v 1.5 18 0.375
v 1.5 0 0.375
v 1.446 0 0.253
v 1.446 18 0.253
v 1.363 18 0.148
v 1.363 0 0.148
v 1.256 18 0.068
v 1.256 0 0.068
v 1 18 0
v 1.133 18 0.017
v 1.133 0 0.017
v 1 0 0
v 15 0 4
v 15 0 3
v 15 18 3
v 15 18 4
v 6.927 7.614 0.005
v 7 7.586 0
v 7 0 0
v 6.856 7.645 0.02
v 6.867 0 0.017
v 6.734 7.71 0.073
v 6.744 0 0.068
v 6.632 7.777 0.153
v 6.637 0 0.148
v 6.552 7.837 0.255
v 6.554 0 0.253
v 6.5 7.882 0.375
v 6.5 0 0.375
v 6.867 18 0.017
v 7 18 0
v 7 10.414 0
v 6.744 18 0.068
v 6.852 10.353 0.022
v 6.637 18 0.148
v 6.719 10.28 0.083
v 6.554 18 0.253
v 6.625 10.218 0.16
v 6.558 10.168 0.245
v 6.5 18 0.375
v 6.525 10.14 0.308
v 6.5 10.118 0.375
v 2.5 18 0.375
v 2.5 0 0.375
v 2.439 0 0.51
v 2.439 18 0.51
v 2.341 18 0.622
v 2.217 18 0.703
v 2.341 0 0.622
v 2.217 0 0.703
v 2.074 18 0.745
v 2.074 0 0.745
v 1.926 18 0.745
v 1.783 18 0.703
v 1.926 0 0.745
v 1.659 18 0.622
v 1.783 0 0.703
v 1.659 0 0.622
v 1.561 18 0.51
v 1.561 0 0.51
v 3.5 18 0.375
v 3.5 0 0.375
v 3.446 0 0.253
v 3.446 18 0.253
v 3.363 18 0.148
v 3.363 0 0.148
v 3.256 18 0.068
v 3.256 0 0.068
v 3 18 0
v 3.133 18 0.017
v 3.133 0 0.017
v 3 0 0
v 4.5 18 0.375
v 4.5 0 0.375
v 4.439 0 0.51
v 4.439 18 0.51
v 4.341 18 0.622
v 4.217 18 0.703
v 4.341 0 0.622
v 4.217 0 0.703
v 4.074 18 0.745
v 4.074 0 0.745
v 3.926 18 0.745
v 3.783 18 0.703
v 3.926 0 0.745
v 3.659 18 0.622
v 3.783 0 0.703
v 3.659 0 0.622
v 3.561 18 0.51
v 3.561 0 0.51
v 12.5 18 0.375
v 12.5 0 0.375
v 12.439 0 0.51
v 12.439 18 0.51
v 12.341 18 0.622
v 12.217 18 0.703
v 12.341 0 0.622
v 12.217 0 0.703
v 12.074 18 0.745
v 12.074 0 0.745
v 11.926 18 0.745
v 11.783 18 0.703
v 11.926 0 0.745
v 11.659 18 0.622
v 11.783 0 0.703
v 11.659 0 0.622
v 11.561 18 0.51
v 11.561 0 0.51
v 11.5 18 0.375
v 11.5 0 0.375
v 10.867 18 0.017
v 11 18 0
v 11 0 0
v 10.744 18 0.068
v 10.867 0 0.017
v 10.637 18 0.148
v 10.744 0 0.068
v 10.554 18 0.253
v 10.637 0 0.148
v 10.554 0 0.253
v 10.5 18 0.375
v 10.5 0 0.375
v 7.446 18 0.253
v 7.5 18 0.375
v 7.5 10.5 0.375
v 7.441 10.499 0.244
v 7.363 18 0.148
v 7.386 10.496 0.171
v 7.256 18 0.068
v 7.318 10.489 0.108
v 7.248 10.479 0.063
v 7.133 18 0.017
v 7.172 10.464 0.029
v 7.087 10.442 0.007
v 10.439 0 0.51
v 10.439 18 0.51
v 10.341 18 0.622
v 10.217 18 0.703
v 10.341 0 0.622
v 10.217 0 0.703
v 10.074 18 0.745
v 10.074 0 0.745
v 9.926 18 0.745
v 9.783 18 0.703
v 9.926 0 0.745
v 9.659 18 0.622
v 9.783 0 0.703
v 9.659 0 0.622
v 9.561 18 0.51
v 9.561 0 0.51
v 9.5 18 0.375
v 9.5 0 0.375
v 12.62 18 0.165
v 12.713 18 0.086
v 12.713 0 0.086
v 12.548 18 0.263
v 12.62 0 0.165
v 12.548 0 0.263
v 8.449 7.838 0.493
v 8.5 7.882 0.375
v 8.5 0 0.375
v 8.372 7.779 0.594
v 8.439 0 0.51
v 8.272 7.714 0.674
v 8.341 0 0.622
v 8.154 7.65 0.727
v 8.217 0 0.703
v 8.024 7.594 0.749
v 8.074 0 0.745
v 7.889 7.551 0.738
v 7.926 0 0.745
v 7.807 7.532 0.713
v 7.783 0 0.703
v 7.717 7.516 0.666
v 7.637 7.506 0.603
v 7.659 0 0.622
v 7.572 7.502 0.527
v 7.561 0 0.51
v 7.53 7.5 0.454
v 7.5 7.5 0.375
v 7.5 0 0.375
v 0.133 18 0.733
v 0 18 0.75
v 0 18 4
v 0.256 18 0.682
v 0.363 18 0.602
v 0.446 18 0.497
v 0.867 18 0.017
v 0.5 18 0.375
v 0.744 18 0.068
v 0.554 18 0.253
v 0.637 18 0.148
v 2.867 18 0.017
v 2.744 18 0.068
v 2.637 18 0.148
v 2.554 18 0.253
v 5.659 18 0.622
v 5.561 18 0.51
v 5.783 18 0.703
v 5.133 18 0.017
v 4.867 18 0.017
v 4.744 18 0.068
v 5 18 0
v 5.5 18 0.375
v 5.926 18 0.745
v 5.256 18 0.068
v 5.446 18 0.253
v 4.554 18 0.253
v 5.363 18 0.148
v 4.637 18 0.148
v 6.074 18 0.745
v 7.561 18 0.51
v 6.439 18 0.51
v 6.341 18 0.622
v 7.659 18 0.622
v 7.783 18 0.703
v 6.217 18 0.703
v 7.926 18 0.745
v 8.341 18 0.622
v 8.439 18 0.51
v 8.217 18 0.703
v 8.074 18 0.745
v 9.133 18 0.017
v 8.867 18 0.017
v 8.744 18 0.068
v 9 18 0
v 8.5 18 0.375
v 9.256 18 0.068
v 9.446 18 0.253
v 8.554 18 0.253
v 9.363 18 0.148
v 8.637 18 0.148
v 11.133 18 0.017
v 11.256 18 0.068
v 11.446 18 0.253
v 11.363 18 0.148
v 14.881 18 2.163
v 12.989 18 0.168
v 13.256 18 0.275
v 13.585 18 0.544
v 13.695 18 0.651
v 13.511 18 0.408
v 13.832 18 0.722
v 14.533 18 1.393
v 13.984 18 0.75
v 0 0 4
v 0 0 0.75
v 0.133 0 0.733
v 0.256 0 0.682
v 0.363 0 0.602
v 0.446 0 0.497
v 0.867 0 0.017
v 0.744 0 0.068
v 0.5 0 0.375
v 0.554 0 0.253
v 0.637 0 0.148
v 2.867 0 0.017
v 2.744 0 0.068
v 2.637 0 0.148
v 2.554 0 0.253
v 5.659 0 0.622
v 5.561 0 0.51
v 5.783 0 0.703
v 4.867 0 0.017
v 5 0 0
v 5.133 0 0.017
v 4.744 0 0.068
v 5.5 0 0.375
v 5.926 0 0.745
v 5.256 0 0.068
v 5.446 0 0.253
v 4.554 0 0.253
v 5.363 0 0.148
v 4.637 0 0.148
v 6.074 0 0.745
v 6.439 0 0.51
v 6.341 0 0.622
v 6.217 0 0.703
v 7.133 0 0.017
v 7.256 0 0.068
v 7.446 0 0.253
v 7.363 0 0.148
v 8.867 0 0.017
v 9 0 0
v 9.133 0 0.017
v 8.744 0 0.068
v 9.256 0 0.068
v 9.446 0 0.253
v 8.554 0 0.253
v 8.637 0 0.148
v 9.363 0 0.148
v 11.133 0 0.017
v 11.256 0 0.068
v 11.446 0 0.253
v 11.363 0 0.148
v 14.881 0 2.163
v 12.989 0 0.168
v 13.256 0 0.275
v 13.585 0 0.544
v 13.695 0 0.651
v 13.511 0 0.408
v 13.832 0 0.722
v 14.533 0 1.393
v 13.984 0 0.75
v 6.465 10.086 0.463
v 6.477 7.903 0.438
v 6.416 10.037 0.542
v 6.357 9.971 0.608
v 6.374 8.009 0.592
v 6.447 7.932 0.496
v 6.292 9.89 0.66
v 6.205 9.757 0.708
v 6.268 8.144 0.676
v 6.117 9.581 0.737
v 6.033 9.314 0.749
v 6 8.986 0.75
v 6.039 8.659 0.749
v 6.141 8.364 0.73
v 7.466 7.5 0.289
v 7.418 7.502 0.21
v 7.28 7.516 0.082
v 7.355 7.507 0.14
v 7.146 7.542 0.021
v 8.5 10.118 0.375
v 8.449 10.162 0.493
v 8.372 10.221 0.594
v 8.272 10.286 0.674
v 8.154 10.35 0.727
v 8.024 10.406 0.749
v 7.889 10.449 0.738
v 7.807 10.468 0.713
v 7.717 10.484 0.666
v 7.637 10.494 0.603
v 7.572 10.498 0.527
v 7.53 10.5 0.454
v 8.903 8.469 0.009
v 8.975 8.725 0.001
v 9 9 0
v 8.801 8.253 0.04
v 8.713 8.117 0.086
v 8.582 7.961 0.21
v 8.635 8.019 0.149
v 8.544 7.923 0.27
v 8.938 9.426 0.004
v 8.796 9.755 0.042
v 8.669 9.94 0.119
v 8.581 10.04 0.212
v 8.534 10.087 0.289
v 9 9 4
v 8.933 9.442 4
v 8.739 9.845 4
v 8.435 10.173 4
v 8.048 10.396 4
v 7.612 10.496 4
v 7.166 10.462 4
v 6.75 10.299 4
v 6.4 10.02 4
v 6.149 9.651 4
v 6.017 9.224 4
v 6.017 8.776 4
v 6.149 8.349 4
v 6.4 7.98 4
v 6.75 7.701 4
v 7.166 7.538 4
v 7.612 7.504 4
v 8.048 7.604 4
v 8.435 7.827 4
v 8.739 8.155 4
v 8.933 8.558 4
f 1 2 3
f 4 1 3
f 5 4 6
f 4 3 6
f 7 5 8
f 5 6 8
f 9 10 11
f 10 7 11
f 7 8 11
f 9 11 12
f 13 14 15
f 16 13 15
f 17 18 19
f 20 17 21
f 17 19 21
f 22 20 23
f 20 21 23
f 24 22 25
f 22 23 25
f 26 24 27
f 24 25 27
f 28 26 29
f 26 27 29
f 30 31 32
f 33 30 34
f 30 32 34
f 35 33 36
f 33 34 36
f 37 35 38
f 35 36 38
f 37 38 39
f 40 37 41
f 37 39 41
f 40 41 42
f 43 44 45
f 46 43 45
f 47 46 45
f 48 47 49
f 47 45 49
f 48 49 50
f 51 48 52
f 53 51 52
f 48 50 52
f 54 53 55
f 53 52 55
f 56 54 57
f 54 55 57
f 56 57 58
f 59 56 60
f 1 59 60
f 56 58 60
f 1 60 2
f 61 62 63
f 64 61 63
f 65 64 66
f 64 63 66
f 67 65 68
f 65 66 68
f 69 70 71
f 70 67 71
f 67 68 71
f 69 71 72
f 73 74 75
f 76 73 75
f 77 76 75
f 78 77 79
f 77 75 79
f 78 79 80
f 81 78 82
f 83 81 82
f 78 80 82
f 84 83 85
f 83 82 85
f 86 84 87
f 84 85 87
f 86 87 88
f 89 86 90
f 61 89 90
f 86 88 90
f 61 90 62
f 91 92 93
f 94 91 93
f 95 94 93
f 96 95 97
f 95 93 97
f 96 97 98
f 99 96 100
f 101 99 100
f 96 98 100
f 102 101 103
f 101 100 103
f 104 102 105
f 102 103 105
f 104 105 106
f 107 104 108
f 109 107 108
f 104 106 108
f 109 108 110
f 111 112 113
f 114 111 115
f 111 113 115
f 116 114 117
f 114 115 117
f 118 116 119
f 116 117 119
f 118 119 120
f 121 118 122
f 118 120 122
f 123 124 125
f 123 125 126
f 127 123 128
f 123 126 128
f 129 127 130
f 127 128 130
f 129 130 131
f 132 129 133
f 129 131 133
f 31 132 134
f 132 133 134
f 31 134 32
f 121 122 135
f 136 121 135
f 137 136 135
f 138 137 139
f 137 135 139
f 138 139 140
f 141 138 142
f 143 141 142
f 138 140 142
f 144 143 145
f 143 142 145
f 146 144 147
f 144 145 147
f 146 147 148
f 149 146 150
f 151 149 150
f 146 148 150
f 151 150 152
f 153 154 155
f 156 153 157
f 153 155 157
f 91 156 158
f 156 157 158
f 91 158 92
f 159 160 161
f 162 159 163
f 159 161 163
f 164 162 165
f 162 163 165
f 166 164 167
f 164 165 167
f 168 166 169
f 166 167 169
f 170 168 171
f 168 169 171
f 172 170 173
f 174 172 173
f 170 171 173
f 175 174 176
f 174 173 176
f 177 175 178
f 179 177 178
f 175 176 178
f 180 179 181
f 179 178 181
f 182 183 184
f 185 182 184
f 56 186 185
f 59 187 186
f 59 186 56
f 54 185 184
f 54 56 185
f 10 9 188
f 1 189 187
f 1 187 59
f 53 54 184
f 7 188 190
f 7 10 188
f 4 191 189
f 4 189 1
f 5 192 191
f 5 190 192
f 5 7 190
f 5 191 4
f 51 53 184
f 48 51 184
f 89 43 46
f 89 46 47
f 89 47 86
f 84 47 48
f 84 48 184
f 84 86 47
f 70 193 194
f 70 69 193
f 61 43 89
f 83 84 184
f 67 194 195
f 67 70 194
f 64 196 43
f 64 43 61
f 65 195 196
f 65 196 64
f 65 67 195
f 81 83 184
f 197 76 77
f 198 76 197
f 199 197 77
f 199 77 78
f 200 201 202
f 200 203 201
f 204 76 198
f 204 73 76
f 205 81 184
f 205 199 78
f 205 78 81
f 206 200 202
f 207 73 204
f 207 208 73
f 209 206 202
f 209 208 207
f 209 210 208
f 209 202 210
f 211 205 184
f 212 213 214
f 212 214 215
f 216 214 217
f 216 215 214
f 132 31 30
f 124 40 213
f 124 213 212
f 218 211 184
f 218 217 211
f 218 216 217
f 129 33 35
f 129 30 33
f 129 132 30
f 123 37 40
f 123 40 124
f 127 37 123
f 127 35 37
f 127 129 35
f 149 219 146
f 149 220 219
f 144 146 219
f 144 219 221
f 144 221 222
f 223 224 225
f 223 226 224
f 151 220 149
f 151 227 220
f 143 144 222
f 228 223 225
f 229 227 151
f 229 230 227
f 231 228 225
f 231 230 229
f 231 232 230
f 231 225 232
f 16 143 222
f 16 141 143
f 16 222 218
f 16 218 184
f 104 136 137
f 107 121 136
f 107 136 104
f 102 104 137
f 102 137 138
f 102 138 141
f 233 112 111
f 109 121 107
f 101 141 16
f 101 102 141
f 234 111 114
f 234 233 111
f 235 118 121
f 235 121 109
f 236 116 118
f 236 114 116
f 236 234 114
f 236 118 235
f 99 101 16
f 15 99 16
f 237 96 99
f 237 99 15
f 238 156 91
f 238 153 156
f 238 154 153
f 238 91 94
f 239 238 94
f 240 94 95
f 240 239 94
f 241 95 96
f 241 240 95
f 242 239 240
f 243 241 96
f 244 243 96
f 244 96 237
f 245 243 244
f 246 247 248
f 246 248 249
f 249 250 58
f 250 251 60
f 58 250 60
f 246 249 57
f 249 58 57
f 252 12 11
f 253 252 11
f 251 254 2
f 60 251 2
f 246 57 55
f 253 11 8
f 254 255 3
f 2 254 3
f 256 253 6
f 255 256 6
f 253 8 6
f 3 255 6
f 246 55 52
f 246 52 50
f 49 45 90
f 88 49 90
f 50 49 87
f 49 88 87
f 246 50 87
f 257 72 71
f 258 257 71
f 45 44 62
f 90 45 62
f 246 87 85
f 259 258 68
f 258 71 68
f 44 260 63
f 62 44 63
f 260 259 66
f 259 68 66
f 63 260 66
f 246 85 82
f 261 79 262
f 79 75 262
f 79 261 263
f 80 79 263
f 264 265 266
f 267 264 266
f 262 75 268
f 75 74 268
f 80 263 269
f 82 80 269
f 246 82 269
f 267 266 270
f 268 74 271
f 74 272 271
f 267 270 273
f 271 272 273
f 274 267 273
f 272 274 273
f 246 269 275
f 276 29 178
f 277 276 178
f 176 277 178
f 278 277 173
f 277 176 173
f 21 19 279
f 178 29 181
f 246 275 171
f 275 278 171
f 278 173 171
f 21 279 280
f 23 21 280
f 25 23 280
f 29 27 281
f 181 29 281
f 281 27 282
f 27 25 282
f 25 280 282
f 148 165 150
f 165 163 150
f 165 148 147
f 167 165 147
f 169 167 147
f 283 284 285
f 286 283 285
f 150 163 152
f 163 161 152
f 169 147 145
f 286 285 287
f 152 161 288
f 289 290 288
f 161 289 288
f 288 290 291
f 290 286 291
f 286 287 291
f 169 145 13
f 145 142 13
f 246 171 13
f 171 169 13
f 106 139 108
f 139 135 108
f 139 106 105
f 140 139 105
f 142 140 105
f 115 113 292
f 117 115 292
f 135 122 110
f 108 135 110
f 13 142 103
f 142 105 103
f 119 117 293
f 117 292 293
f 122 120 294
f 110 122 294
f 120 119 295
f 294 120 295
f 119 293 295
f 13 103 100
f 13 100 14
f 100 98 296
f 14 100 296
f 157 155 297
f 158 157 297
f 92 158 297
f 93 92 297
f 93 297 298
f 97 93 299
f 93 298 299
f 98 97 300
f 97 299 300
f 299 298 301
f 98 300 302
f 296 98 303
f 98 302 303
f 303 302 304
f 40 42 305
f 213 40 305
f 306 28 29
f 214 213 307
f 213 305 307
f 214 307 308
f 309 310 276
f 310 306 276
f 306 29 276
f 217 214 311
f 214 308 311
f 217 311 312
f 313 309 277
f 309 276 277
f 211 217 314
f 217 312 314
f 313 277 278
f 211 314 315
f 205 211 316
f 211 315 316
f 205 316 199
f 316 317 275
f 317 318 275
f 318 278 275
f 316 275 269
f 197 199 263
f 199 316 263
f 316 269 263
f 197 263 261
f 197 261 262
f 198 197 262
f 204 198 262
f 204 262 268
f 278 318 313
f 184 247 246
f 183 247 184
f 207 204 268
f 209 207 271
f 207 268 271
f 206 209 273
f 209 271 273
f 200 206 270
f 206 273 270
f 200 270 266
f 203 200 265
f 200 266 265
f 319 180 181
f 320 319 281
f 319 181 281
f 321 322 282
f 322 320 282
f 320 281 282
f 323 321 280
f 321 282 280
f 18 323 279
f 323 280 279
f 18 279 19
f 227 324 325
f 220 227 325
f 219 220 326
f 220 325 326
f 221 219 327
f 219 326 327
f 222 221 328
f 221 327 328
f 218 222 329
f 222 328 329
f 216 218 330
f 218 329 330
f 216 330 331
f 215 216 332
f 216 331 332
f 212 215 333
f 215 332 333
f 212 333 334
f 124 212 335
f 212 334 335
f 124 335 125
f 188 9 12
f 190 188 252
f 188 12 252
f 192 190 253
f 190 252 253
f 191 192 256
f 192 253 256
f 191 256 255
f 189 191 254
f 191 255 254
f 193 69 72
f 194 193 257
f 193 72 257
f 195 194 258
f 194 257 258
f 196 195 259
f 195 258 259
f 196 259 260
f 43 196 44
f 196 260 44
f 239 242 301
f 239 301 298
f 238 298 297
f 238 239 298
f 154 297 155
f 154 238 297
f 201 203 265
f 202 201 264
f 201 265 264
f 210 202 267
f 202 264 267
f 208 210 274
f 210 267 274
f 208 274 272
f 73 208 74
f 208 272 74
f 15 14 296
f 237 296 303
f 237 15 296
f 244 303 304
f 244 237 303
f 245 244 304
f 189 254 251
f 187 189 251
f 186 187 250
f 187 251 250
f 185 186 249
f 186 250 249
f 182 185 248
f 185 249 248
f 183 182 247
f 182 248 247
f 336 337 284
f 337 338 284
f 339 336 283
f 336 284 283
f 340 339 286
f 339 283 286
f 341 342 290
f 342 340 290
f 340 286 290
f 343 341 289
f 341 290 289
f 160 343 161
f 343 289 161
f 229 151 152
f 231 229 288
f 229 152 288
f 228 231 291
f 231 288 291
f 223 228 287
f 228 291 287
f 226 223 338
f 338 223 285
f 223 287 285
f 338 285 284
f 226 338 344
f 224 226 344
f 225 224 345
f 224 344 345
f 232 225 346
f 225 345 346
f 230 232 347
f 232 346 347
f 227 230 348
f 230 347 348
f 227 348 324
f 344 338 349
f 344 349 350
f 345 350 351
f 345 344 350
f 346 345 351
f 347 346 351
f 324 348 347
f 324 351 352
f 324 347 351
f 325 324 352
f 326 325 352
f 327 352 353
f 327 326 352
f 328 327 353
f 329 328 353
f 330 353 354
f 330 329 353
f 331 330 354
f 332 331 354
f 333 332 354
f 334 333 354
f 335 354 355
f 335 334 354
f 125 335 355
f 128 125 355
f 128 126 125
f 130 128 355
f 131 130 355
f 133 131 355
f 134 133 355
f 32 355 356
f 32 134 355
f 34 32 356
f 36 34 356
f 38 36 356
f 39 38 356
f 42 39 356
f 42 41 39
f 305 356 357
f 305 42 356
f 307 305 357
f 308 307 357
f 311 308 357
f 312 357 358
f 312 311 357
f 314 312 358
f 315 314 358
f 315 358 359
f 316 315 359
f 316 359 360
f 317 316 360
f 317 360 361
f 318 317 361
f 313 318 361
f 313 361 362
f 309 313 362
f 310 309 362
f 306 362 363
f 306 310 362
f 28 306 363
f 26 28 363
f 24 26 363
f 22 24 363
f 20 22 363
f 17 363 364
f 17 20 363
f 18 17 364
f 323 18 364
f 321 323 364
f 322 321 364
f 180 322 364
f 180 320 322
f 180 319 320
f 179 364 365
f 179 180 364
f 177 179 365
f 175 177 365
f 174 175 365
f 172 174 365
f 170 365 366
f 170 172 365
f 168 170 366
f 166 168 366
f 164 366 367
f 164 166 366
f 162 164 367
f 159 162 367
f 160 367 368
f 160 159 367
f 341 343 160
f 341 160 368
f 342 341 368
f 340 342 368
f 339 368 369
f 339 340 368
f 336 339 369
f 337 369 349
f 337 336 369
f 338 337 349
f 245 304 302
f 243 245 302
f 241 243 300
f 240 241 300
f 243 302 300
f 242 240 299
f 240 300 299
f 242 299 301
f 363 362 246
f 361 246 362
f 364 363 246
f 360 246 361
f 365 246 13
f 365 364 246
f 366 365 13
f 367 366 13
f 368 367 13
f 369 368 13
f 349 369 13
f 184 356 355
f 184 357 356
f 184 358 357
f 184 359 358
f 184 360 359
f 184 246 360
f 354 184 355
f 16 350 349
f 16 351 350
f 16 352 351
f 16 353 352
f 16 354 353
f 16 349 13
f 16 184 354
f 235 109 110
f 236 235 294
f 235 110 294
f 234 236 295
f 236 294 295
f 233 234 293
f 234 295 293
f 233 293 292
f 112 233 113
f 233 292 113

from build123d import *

# Parameters (mm, degrees)
SKETCH1_W           = 15
SKETCH1_H           = 18
SKETCH1_R           = 1.5
BOSS_EXTRUDE1_DEPTH = 4
FILLET1_R           = 3
CUT_EXTRUDE2_DEPTH  = 24.769728648
LPATTERN1_COUNT     = 10
LPATTERN1_PITCH     = 2


with BuildPart() as part:
    # Sketch1 → Boss-Extrude1 (new body)
    with BuildSketch(Plane.XY):
        with Locations((7.5, 9)):
            Rectangle(SKETCH1_W, SKETCH1_H)
        with Locations((7.5, 9)):
            Circle(SKETCH1_R, mode=Mode.SUBTRACT)
    extrude(amount=BOSS_EXTRUDE1_DEPTH)

    # Fillet1
    fillet1_edges = [part.edges().sort_by_distance(p)[0] for p in [
        (15, 9, 0),
    ]]
    fillet(fillet1_edges, radius=FILLET1_R)

    # Sketch2 → Cut-Extrude2 (cut, through all)
    with BuildSketch(Plane(origin=(0, 0, 0), x_dir=(1, 0, 0), z_dir=(0, 1, 0))):
        with BuildLine():
            Line((-1, 0), (1, 0))
            ThreePointArc((1, 0), (0.6875, -0.104166667), (0.5, -0.375))
            ThreePointArc((0.5, -0.375), (0, -0.75), (-0.5, -0.375))
            ThreePointArc((-0.5, -0.375), (-0.6875, -0.104166667), (-1, 0))
        make_face()
    cut_extrude2 = extrude(amount=CUT_EXTRUDE2_DEPTH, mode=Mode.SUBTRACT)

    # LPattern1: Cut-Extrude2 ×10
    with Locations(*[(i * LPATTERN1_PITCH, 0, 0) for i in range(1, LPATTERN1_COUNT)]):
        add(cut_extrude2, mode=Mode.SUBTRACT)


solid = part.part
